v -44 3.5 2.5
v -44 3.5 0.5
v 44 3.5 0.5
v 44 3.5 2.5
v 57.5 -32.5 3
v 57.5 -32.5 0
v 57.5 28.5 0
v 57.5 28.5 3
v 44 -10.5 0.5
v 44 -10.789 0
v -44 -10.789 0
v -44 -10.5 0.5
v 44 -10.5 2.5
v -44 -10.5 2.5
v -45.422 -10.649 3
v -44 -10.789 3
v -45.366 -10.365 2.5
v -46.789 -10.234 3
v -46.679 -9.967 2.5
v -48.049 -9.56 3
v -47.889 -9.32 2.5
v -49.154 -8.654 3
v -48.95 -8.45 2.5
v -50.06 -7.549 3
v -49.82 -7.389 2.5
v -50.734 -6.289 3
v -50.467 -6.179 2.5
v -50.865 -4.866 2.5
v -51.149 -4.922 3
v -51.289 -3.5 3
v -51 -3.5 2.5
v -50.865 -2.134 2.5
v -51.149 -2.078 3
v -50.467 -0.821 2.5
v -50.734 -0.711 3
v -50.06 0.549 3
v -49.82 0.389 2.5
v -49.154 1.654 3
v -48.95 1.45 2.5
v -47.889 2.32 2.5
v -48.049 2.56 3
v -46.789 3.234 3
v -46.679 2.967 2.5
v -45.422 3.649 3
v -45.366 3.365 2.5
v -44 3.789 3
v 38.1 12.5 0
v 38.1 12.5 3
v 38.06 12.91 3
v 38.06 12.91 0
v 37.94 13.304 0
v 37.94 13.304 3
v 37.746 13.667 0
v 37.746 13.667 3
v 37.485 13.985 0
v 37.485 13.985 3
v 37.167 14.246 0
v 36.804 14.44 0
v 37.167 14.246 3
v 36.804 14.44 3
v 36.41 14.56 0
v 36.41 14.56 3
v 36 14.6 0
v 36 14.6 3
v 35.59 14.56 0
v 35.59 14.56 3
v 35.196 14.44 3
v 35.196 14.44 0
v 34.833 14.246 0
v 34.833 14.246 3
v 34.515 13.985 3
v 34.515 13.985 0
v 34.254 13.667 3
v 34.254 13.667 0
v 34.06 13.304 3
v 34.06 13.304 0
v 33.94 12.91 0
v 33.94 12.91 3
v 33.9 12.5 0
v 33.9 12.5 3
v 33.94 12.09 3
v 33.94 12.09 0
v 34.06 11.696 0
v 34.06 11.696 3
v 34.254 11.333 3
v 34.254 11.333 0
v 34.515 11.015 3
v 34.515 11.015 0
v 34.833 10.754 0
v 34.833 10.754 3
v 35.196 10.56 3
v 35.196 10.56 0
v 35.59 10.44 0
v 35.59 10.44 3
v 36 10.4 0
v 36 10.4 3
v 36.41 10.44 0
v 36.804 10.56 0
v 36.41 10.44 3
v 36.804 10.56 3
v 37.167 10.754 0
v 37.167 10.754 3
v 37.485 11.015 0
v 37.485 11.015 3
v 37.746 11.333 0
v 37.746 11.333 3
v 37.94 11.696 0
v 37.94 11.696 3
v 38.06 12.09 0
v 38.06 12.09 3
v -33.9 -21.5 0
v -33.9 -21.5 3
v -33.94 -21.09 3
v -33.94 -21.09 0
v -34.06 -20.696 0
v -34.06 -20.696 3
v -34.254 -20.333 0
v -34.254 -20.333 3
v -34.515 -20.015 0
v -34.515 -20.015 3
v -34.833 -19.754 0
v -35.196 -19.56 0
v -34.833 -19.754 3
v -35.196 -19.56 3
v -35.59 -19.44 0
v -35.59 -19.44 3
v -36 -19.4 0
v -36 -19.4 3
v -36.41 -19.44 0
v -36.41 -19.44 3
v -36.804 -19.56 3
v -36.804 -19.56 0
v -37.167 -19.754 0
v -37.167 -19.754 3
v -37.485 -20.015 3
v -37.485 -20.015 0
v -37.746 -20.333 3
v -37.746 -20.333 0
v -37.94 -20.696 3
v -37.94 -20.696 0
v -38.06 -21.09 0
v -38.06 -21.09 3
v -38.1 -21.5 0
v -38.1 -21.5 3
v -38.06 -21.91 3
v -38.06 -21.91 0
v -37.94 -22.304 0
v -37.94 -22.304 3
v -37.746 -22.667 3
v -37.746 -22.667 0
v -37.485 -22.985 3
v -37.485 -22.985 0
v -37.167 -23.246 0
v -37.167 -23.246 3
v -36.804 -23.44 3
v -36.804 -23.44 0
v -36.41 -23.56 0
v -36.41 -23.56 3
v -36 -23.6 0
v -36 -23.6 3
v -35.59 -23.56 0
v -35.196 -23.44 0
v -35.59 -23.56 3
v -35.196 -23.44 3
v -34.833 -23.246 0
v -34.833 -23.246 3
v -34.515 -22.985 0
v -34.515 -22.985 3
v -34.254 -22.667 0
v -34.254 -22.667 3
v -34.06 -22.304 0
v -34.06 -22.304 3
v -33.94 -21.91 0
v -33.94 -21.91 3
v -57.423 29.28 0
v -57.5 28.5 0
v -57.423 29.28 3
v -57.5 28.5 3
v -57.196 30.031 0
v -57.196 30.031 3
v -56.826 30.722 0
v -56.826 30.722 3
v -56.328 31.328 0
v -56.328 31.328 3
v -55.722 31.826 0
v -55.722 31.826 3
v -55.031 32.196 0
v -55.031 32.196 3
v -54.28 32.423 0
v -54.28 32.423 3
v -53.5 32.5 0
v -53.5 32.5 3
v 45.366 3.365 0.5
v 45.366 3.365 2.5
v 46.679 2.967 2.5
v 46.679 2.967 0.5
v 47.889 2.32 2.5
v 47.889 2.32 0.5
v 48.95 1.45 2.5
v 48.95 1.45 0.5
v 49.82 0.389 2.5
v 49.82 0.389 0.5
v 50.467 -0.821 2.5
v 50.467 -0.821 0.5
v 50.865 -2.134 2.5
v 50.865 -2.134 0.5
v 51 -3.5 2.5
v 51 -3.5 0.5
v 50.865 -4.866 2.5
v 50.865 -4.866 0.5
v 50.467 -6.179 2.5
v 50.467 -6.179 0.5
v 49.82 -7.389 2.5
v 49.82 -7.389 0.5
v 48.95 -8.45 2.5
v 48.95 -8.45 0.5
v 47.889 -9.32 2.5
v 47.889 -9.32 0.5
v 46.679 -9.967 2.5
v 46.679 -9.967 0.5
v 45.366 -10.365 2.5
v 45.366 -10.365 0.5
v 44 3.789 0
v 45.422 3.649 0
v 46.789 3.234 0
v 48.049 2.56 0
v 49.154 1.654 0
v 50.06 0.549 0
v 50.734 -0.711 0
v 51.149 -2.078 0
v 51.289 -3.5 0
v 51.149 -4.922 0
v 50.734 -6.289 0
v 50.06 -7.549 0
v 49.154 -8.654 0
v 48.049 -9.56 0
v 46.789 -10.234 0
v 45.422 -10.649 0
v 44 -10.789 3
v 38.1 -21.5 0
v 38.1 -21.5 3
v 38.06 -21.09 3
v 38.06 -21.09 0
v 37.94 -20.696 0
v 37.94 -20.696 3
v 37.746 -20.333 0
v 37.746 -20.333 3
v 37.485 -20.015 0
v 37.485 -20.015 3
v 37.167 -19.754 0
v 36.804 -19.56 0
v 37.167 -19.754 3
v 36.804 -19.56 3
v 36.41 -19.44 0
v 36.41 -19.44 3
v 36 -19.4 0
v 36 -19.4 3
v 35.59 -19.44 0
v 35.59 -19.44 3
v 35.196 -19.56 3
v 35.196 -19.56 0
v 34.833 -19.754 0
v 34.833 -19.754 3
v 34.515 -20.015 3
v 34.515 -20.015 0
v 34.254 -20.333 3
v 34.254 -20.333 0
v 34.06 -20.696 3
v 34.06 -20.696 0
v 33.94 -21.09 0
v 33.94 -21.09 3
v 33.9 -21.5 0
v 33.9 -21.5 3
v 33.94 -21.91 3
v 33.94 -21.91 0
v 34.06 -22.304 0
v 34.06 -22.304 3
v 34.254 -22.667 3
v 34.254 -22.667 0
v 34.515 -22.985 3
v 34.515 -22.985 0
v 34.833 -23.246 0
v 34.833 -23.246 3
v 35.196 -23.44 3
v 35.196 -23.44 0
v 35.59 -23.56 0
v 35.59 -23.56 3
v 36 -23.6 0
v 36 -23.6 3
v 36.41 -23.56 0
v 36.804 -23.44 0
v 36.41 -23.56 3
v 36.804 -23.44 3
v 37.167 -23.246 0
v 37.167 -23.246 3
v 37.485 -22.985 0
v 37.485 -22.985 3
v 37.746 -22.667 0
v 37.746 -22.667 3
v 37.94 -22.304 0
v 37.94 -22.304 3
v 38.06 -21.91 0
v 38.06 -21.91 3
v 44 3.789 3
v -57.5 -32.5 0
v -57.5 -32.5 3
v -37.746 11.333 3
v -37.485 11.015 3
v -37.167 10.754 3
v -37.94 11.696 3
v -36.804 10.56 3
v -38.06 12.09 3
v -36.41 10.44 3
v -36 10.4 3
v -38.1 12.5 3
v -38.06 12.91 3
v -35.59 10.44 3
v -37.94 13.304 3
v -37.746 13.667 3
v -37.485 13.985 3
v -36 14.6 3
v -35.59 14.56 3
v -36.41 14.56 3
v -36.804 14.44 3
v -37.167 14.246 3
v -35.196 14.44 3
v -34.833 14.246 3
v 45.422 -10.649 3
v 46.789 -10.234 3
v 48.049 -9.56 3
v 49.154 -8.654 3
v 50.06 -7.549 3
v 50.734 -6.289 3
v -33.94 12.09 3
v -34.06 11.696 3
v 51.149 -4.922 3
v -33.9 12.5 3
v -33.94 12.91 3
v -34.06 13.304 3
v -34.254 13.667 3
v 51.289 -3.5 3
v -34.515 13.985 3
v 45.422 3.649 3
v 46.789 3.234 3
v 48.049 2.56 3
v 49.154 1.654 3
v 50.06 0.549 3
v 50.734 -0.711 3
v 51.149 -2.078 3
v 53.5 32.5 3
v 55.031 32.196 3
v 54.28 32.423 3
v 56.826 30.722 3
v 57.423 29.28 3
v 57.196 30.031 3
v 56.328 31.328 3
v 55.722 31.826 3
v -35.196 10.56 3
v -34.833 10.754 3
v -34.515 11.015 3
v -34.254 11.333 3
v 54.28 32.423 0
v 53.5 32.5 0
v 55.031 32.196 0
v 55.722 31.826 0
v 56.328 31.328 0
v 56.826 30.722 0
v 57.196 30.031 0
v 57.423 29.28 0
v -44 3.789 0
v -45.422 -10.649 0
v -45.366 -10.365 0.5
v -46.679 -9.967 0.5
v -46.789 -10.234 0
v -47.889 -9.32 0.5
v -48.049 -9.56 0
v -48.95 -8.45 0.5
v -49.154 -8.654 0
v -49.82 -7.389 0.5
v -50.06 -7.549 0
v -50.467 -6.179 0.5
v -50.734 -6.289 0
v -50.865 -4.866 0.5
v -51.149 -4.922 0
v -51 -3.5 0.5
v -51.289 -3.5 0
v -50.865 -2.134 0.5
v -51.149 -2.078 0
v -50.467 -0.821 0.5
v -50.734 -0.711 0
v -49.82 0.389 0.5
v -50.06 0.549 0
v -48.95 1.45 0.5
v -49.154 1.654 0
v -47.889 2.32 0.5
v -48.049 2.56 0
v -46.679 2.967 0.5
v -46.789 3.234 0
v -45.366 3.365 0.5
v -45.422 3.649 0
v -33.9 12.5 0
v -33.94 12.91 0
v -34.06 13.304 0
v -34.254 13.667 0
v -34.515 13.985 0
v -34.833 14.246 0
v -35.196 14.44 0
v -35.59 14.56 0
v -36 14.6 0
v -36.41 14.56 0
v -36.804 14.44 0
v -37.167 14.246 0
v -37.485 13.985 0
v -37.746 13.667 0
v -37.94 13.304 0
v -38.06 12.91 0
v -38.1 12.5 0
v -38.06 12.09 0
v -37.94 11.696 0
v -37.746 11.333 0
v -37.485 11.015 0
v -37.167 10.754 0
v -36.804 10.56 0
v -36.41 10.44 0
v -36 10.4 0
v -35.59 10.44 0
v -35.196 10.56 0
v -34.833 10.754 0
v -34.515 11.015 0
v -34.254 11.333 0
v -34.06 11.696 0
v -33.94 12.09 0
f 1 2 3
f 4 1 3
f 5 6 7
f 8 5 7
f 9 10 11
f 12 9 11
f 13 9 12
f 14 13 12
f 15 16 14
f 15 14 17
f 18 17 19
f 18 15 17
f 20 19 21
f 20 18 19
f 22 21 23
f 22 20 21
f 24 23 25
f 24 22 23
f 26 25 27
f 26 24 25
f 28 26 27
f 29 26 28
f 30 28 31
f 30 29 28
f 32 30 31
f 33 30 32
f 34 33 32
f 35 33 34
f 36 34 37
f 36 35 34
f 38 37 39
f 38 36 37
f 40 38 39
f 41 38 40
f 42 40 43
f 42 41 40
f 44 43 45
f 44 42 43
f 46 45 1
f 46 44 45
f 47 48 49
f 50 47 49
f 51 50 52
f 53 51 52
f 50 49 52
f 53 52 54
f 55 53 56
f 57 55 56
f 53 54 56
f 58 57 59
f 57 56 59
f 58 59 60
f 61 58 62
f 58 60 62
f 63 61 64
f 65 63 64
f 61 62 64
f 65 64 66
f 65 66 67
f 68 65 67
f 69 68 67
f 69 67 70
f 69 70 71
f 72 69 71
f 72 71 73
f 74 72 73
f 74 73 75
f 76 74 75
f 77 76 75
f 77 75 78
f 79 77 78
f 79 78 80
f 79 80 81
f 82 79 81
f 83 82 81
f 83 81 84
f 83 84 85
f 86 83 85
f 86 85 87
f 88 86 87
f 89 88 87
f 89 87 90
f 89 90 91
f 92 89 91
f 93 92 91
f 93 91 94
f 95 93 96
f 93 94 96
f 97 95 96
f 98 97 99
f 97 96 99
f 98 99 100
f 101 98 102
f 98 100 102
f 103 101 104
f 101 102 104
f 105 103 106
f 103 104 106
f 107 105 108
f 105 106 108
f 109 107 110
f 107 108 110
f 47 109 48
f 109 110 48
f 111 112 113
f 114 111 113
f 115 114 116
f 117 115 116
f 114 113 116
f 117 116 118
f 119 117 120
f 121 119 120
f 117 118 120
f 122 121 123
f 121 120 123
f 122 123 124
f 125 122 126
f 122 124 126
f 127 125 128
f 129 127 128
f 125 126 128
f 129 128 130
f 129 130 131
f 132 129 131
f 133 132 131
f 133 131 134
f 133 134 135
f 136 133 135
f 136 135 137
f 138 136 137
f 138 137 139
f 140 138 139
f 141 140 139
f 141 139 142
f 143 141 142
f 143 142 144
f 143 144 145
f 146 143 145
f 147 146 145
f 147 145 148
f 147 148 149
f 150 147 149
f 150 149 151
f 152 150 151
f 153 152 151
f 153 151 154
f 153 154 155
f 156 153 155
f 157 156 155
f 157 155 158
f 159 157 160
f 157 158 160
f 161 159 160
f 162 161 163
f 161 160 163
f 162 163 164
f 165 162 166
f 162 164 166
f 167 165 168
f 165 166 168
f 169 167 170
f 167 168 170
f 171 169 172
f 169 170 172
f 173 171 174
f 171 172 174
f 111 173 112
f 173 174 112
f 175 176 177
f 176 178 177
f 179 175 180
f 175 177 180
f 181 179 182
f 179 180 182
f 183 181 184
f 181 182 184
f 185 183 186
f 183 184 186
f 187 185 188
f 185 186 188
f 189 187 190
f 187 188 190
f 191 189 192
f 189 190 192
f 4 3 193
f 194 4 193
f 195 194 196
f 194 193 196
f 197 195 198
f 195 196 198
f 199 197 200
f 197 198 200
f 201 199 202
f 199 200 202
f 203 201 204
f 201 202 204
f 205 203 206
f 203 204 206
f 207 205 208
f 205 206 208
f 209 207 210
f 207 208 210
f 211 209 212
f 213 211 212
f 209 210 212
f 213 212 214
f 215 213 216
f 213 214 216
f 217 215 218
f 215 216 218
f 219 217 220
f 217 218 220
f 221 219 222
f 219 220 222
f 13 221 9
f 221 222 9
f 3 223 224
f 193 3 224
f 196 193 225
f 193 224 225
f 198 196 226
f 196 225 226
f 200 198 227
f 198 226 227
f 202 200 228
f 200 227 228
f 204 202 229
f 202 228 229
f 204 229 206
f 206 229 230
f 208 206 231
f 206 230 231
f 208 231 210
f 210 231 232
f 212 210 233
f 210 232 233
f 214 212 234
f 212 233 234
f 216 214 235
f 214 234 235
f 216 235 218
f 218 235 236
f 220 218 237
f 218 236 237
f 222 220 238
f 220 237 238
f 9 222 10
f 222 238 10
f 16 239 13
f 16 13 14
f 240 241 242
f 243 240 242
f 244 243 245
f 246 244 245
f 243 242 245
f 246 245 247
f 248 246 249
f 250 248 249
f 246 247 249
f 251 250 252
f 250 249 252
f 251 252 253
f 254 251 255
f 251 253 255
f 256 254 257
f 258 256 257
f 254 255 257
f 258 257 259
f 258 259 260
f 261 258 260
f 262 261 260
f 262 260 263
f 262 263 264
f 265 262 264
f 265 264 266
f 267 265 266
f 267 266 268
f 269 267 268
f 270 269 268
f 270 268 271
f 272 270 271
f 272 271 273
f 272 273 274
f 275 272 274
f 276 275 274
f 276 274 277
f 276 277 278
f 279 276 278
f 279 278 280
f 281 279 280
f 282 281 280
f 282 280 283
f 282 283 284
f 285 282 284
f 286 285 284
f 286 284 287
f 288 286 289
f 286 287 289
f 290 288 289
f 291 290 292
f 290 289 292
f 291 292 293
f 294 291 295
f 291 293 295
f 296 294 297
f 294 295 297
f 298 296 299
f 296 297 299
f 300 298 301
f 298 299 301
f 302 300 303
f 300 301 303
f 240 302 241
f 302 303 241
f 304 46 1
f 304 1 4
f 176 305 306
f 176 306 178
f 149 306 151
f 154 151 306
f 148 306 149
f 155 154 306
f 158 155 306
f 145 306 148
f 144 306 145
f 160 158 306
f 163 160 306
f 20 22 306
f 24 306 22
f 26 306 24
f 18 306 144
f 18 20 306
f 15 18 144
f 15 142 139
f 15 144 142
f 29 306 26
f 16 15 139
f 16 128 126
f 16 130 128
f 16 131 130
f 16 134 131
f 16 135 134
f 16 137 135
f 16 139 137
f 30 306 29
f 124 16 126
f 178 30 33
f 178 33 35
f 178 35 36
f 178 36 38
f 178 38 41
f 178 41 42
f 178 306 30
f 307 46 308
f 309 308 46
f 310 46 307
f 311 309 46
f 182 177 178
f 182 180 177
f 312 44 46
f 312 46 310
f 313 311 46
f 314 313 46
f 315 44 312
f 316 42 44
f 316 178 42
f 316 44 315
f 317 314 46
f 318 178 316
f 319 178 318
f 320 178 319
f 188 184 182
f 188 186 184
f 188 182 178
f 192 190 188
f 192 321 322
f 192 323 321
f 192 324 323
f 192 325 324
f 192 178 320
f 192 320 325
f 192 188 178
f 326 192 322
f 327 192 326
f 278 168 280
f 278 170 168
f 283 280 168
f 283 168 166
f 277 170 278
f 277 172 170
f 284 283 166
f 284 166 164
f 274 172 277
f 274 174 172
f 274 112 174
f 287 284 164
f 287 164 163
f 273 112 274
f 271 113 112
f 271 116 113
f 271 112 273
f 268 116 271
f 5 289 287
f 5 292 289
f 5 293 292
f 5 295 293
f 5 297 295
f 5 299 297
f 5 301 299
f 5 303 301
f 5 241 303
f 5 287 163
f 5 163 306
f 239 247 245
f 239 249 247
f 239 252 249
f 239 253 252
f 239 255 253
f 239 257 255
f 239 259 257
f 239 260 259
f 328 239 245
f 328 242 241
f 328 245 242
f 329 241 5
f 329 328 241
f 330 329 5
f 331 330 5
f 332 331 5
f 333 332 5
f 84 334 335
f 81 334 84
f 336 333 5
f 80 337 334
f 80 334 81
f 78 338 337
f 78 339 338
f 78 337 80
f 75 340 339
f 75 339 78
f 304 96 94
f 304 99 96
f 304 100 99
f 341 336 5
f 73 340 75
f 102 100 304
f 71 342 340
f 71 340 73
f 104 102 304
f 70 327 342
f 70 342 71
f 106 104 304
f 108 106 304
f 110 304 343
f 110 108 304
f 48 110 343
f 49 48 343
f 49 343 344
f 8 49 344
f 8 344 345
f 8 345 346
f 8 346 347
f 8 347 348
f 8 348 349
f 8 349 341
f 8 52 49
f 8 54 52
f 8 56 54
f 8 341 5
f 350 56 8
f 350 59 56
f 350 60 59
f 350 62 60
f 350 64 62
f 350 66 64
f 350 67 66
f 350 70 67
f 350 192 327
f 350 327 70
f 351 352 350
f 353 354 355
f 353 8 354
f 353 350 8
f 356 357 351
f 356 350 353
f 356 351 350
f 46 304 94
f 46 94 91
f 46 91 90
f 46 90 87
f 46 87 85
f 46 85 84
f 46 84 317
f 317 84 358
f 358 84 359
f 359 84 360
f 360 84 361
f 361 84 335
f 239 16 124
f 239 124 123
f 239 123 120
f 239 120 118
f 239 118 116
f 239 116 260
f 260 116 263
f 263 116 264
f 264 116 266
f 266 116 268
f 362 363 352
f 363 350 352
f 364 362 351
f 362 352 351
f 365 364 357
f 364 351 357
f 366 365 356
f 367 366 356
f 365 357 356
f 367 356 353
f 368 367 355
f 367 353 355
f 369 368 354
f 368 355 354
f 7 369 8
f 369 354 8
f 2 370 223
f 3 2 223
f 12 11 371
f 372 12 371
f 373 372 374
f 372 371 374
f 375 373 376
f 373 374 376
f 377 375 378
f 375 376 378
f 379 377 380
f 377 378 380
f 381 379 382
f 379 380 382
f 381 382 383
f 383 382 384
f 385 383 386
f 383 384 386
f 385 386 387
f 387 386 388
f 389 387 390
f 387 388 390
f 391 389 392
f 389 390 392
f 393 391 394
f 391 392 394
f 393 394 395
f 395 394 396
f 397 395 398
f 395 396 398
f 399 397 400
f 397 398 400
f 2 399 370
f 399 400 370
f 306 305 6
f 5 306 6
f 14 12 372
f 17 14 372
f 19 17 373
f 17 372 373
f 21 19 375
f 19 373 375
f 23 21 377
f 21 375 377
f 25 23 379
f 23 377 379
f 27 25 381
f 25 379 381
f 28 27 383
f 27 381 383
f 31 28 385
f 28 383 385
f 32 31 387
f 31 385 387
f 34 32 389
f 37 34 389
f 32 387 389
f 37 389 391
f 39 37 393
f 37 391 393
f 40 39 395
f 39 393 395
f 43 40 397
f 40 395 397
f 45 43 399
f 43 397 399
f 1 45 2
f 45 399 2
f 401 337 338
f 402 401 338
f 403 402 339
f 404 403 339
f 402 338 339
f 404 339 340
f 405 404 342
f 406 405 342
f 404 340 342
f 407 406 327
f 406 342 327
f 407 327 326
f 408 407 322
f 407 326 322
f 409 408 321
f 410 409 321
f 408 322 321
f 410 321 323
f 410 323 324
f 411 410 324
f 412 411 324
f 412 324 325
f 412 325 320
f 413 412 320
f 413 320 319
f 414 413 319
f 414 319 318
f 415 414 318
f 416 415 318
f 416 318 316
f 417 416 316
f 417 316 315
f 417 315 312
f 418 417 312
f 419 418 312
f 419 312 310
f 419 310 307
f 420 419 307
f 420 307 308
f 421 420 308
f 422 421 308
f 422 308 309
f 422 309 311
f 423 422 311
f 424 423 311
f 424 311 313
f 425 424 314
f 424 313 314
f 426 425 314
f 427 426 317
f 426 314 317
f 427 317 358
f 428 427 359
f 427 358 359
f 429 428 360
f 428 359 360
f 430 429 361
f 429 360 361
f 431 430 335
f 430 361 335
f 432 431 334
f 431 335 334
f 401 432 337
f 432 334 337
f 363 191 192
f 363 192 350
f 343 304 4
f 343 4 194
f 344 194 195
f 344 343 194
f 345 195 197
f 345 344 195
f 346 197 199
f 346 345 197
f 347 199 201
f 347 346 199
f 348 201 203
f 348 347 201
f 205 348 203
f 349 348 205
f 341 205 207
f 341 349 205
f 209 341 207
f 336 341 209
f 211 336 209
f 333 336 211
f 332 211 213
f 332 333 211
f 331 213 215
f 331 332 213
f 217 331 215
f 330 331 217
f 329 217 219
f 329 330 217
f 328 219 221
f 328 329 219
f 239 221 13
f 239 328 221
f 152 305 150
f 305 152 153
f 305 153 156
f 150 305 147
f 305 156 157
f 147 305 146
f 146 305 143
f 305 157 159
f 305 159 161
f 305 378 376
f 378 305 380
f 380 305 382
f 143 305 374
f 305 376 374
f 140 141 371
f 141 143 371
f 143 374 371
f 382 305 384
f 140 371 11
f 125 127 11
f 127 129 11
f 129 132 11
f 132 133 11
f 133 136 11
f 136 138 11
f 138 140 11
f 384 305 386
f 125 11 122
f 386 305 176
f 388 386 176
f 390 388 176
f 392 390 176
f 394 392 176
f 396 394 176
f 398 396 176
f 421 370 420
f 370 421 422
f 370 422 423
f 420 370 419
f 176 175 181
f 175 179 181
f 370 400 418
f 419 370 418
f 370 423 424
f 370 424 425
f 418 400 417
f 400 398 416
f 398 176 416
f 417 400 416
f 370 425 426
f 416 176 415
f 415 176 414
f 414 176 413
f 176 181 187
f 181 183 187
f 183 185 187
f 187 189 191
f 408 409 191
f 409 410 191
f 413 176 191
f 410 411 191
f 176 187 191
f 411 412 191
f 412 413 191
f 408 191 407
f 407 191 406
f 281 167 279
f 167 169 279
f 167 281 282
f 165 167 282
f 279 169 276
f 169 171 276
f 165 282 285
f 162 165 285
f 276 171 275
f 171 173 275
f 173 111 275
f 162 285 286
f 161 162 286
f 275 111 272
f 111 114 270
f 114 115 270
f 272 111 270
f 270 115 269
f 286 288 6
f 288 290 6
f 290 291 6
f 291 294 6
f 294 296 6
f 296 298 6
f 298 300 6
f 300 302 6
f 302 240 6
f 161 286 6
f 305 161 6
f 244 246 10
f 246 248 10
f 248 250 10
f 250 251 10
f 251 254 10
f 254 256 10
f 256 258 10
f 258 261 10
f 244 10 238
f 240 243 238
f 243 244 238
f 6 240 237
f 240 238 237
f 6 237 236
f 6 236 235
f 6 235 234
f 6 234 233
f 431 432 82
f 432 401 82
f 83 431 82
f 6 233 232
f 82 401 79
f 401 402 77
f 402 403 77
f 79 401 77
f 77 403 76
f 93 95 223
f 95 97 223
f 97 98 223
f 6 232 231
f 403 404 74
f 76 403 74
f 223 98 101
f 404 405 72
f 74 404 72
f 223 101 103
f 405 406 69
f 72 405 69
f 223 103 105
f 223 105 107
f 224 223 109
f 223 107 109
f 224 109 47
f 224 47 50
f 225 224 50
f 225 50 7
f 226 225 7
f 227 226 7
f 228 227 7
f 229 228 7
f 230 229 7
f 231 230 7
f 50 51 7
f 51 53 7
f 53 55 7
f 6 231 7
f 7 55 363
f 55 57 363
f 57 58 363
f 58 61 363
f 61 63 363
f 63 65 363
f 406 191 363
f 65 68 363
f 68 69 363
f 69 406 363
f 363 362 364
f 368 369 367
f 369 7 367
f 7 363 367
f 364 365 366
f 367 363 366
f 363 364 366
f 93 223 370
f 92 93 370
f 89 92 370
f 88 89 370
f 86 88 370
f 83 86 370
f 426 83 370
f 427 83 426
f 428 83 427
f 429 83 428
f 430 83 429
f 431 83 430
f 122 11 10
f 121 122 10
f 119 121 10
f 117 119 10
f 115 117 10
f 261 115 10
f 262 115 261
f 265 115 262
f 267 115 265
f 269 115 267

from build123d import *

# Parameters (mm, degrees)
F0_W     = 115
F0_H     = 65
F1_DEPTH = 3
F2_R     = 2.1
F3_DEPTH = 25
F4_R     = 4
F5_SIZE2 = 0.2886751346
F5_SIZE  = 0.5


with BuildPart() as f1:
    # F0 (on Top) → F1 (new body)
    with BuildSketch(Plane.XY):
        Rectangle(F0_W, F0_H)
        with BuildLine():
            Line((44, -10.5), (-44, -10.5))
            ThreePointArc((-44, -10.5), (-51, -3.5), (-44, 3.5))
            Line((-44, 3.5), (44, 3.5))
            ThreePointArc((44, 3.5), (51, -3.5), (44, -10.5))
        make_face(mode=Mode.SUBTRACT)
    extrude(amount=F1_DEPTH)

    # F2 (on face) → F3 (cut)
    with BuildSketch(Plane.XY.offset(3)):
        with Locations((-36, -21.5)):
            Circle(F2_R)
        with Locations((36, -21.5)):
            Circle(F2_R)
        with Locations((36, 12.5)):
            Circle(F2_R)
        with Locations((-36, 12.5)):
            Circle(F2_R)
    extrude(amount=-F3_DEPTH, mode=Mode.SUBTRACT)

    # F4
    f4_edges = [f1.edges().sort_by_distance(p)[0] for p in [
        (57.5, 32.5, 1.5),
        (-57.5, 32.5, 1.5),
    ]]
    fillet(f4_edges, radius=F4_R)

    # F5
    f5_edges = [f1.edges().sort_by_distance(p)[0] for p in [
        (0, 3.5, 3),
        (0, 3.5, 0),
    ]]
    f5_side = f1.faces().sort_by_distance((0, 3.5, 1.5))[0]
    chamfer(f5_edges, length=F5_SIZE, length2=F5_SIZE2, reference=f5_side)


solid = f1.part
